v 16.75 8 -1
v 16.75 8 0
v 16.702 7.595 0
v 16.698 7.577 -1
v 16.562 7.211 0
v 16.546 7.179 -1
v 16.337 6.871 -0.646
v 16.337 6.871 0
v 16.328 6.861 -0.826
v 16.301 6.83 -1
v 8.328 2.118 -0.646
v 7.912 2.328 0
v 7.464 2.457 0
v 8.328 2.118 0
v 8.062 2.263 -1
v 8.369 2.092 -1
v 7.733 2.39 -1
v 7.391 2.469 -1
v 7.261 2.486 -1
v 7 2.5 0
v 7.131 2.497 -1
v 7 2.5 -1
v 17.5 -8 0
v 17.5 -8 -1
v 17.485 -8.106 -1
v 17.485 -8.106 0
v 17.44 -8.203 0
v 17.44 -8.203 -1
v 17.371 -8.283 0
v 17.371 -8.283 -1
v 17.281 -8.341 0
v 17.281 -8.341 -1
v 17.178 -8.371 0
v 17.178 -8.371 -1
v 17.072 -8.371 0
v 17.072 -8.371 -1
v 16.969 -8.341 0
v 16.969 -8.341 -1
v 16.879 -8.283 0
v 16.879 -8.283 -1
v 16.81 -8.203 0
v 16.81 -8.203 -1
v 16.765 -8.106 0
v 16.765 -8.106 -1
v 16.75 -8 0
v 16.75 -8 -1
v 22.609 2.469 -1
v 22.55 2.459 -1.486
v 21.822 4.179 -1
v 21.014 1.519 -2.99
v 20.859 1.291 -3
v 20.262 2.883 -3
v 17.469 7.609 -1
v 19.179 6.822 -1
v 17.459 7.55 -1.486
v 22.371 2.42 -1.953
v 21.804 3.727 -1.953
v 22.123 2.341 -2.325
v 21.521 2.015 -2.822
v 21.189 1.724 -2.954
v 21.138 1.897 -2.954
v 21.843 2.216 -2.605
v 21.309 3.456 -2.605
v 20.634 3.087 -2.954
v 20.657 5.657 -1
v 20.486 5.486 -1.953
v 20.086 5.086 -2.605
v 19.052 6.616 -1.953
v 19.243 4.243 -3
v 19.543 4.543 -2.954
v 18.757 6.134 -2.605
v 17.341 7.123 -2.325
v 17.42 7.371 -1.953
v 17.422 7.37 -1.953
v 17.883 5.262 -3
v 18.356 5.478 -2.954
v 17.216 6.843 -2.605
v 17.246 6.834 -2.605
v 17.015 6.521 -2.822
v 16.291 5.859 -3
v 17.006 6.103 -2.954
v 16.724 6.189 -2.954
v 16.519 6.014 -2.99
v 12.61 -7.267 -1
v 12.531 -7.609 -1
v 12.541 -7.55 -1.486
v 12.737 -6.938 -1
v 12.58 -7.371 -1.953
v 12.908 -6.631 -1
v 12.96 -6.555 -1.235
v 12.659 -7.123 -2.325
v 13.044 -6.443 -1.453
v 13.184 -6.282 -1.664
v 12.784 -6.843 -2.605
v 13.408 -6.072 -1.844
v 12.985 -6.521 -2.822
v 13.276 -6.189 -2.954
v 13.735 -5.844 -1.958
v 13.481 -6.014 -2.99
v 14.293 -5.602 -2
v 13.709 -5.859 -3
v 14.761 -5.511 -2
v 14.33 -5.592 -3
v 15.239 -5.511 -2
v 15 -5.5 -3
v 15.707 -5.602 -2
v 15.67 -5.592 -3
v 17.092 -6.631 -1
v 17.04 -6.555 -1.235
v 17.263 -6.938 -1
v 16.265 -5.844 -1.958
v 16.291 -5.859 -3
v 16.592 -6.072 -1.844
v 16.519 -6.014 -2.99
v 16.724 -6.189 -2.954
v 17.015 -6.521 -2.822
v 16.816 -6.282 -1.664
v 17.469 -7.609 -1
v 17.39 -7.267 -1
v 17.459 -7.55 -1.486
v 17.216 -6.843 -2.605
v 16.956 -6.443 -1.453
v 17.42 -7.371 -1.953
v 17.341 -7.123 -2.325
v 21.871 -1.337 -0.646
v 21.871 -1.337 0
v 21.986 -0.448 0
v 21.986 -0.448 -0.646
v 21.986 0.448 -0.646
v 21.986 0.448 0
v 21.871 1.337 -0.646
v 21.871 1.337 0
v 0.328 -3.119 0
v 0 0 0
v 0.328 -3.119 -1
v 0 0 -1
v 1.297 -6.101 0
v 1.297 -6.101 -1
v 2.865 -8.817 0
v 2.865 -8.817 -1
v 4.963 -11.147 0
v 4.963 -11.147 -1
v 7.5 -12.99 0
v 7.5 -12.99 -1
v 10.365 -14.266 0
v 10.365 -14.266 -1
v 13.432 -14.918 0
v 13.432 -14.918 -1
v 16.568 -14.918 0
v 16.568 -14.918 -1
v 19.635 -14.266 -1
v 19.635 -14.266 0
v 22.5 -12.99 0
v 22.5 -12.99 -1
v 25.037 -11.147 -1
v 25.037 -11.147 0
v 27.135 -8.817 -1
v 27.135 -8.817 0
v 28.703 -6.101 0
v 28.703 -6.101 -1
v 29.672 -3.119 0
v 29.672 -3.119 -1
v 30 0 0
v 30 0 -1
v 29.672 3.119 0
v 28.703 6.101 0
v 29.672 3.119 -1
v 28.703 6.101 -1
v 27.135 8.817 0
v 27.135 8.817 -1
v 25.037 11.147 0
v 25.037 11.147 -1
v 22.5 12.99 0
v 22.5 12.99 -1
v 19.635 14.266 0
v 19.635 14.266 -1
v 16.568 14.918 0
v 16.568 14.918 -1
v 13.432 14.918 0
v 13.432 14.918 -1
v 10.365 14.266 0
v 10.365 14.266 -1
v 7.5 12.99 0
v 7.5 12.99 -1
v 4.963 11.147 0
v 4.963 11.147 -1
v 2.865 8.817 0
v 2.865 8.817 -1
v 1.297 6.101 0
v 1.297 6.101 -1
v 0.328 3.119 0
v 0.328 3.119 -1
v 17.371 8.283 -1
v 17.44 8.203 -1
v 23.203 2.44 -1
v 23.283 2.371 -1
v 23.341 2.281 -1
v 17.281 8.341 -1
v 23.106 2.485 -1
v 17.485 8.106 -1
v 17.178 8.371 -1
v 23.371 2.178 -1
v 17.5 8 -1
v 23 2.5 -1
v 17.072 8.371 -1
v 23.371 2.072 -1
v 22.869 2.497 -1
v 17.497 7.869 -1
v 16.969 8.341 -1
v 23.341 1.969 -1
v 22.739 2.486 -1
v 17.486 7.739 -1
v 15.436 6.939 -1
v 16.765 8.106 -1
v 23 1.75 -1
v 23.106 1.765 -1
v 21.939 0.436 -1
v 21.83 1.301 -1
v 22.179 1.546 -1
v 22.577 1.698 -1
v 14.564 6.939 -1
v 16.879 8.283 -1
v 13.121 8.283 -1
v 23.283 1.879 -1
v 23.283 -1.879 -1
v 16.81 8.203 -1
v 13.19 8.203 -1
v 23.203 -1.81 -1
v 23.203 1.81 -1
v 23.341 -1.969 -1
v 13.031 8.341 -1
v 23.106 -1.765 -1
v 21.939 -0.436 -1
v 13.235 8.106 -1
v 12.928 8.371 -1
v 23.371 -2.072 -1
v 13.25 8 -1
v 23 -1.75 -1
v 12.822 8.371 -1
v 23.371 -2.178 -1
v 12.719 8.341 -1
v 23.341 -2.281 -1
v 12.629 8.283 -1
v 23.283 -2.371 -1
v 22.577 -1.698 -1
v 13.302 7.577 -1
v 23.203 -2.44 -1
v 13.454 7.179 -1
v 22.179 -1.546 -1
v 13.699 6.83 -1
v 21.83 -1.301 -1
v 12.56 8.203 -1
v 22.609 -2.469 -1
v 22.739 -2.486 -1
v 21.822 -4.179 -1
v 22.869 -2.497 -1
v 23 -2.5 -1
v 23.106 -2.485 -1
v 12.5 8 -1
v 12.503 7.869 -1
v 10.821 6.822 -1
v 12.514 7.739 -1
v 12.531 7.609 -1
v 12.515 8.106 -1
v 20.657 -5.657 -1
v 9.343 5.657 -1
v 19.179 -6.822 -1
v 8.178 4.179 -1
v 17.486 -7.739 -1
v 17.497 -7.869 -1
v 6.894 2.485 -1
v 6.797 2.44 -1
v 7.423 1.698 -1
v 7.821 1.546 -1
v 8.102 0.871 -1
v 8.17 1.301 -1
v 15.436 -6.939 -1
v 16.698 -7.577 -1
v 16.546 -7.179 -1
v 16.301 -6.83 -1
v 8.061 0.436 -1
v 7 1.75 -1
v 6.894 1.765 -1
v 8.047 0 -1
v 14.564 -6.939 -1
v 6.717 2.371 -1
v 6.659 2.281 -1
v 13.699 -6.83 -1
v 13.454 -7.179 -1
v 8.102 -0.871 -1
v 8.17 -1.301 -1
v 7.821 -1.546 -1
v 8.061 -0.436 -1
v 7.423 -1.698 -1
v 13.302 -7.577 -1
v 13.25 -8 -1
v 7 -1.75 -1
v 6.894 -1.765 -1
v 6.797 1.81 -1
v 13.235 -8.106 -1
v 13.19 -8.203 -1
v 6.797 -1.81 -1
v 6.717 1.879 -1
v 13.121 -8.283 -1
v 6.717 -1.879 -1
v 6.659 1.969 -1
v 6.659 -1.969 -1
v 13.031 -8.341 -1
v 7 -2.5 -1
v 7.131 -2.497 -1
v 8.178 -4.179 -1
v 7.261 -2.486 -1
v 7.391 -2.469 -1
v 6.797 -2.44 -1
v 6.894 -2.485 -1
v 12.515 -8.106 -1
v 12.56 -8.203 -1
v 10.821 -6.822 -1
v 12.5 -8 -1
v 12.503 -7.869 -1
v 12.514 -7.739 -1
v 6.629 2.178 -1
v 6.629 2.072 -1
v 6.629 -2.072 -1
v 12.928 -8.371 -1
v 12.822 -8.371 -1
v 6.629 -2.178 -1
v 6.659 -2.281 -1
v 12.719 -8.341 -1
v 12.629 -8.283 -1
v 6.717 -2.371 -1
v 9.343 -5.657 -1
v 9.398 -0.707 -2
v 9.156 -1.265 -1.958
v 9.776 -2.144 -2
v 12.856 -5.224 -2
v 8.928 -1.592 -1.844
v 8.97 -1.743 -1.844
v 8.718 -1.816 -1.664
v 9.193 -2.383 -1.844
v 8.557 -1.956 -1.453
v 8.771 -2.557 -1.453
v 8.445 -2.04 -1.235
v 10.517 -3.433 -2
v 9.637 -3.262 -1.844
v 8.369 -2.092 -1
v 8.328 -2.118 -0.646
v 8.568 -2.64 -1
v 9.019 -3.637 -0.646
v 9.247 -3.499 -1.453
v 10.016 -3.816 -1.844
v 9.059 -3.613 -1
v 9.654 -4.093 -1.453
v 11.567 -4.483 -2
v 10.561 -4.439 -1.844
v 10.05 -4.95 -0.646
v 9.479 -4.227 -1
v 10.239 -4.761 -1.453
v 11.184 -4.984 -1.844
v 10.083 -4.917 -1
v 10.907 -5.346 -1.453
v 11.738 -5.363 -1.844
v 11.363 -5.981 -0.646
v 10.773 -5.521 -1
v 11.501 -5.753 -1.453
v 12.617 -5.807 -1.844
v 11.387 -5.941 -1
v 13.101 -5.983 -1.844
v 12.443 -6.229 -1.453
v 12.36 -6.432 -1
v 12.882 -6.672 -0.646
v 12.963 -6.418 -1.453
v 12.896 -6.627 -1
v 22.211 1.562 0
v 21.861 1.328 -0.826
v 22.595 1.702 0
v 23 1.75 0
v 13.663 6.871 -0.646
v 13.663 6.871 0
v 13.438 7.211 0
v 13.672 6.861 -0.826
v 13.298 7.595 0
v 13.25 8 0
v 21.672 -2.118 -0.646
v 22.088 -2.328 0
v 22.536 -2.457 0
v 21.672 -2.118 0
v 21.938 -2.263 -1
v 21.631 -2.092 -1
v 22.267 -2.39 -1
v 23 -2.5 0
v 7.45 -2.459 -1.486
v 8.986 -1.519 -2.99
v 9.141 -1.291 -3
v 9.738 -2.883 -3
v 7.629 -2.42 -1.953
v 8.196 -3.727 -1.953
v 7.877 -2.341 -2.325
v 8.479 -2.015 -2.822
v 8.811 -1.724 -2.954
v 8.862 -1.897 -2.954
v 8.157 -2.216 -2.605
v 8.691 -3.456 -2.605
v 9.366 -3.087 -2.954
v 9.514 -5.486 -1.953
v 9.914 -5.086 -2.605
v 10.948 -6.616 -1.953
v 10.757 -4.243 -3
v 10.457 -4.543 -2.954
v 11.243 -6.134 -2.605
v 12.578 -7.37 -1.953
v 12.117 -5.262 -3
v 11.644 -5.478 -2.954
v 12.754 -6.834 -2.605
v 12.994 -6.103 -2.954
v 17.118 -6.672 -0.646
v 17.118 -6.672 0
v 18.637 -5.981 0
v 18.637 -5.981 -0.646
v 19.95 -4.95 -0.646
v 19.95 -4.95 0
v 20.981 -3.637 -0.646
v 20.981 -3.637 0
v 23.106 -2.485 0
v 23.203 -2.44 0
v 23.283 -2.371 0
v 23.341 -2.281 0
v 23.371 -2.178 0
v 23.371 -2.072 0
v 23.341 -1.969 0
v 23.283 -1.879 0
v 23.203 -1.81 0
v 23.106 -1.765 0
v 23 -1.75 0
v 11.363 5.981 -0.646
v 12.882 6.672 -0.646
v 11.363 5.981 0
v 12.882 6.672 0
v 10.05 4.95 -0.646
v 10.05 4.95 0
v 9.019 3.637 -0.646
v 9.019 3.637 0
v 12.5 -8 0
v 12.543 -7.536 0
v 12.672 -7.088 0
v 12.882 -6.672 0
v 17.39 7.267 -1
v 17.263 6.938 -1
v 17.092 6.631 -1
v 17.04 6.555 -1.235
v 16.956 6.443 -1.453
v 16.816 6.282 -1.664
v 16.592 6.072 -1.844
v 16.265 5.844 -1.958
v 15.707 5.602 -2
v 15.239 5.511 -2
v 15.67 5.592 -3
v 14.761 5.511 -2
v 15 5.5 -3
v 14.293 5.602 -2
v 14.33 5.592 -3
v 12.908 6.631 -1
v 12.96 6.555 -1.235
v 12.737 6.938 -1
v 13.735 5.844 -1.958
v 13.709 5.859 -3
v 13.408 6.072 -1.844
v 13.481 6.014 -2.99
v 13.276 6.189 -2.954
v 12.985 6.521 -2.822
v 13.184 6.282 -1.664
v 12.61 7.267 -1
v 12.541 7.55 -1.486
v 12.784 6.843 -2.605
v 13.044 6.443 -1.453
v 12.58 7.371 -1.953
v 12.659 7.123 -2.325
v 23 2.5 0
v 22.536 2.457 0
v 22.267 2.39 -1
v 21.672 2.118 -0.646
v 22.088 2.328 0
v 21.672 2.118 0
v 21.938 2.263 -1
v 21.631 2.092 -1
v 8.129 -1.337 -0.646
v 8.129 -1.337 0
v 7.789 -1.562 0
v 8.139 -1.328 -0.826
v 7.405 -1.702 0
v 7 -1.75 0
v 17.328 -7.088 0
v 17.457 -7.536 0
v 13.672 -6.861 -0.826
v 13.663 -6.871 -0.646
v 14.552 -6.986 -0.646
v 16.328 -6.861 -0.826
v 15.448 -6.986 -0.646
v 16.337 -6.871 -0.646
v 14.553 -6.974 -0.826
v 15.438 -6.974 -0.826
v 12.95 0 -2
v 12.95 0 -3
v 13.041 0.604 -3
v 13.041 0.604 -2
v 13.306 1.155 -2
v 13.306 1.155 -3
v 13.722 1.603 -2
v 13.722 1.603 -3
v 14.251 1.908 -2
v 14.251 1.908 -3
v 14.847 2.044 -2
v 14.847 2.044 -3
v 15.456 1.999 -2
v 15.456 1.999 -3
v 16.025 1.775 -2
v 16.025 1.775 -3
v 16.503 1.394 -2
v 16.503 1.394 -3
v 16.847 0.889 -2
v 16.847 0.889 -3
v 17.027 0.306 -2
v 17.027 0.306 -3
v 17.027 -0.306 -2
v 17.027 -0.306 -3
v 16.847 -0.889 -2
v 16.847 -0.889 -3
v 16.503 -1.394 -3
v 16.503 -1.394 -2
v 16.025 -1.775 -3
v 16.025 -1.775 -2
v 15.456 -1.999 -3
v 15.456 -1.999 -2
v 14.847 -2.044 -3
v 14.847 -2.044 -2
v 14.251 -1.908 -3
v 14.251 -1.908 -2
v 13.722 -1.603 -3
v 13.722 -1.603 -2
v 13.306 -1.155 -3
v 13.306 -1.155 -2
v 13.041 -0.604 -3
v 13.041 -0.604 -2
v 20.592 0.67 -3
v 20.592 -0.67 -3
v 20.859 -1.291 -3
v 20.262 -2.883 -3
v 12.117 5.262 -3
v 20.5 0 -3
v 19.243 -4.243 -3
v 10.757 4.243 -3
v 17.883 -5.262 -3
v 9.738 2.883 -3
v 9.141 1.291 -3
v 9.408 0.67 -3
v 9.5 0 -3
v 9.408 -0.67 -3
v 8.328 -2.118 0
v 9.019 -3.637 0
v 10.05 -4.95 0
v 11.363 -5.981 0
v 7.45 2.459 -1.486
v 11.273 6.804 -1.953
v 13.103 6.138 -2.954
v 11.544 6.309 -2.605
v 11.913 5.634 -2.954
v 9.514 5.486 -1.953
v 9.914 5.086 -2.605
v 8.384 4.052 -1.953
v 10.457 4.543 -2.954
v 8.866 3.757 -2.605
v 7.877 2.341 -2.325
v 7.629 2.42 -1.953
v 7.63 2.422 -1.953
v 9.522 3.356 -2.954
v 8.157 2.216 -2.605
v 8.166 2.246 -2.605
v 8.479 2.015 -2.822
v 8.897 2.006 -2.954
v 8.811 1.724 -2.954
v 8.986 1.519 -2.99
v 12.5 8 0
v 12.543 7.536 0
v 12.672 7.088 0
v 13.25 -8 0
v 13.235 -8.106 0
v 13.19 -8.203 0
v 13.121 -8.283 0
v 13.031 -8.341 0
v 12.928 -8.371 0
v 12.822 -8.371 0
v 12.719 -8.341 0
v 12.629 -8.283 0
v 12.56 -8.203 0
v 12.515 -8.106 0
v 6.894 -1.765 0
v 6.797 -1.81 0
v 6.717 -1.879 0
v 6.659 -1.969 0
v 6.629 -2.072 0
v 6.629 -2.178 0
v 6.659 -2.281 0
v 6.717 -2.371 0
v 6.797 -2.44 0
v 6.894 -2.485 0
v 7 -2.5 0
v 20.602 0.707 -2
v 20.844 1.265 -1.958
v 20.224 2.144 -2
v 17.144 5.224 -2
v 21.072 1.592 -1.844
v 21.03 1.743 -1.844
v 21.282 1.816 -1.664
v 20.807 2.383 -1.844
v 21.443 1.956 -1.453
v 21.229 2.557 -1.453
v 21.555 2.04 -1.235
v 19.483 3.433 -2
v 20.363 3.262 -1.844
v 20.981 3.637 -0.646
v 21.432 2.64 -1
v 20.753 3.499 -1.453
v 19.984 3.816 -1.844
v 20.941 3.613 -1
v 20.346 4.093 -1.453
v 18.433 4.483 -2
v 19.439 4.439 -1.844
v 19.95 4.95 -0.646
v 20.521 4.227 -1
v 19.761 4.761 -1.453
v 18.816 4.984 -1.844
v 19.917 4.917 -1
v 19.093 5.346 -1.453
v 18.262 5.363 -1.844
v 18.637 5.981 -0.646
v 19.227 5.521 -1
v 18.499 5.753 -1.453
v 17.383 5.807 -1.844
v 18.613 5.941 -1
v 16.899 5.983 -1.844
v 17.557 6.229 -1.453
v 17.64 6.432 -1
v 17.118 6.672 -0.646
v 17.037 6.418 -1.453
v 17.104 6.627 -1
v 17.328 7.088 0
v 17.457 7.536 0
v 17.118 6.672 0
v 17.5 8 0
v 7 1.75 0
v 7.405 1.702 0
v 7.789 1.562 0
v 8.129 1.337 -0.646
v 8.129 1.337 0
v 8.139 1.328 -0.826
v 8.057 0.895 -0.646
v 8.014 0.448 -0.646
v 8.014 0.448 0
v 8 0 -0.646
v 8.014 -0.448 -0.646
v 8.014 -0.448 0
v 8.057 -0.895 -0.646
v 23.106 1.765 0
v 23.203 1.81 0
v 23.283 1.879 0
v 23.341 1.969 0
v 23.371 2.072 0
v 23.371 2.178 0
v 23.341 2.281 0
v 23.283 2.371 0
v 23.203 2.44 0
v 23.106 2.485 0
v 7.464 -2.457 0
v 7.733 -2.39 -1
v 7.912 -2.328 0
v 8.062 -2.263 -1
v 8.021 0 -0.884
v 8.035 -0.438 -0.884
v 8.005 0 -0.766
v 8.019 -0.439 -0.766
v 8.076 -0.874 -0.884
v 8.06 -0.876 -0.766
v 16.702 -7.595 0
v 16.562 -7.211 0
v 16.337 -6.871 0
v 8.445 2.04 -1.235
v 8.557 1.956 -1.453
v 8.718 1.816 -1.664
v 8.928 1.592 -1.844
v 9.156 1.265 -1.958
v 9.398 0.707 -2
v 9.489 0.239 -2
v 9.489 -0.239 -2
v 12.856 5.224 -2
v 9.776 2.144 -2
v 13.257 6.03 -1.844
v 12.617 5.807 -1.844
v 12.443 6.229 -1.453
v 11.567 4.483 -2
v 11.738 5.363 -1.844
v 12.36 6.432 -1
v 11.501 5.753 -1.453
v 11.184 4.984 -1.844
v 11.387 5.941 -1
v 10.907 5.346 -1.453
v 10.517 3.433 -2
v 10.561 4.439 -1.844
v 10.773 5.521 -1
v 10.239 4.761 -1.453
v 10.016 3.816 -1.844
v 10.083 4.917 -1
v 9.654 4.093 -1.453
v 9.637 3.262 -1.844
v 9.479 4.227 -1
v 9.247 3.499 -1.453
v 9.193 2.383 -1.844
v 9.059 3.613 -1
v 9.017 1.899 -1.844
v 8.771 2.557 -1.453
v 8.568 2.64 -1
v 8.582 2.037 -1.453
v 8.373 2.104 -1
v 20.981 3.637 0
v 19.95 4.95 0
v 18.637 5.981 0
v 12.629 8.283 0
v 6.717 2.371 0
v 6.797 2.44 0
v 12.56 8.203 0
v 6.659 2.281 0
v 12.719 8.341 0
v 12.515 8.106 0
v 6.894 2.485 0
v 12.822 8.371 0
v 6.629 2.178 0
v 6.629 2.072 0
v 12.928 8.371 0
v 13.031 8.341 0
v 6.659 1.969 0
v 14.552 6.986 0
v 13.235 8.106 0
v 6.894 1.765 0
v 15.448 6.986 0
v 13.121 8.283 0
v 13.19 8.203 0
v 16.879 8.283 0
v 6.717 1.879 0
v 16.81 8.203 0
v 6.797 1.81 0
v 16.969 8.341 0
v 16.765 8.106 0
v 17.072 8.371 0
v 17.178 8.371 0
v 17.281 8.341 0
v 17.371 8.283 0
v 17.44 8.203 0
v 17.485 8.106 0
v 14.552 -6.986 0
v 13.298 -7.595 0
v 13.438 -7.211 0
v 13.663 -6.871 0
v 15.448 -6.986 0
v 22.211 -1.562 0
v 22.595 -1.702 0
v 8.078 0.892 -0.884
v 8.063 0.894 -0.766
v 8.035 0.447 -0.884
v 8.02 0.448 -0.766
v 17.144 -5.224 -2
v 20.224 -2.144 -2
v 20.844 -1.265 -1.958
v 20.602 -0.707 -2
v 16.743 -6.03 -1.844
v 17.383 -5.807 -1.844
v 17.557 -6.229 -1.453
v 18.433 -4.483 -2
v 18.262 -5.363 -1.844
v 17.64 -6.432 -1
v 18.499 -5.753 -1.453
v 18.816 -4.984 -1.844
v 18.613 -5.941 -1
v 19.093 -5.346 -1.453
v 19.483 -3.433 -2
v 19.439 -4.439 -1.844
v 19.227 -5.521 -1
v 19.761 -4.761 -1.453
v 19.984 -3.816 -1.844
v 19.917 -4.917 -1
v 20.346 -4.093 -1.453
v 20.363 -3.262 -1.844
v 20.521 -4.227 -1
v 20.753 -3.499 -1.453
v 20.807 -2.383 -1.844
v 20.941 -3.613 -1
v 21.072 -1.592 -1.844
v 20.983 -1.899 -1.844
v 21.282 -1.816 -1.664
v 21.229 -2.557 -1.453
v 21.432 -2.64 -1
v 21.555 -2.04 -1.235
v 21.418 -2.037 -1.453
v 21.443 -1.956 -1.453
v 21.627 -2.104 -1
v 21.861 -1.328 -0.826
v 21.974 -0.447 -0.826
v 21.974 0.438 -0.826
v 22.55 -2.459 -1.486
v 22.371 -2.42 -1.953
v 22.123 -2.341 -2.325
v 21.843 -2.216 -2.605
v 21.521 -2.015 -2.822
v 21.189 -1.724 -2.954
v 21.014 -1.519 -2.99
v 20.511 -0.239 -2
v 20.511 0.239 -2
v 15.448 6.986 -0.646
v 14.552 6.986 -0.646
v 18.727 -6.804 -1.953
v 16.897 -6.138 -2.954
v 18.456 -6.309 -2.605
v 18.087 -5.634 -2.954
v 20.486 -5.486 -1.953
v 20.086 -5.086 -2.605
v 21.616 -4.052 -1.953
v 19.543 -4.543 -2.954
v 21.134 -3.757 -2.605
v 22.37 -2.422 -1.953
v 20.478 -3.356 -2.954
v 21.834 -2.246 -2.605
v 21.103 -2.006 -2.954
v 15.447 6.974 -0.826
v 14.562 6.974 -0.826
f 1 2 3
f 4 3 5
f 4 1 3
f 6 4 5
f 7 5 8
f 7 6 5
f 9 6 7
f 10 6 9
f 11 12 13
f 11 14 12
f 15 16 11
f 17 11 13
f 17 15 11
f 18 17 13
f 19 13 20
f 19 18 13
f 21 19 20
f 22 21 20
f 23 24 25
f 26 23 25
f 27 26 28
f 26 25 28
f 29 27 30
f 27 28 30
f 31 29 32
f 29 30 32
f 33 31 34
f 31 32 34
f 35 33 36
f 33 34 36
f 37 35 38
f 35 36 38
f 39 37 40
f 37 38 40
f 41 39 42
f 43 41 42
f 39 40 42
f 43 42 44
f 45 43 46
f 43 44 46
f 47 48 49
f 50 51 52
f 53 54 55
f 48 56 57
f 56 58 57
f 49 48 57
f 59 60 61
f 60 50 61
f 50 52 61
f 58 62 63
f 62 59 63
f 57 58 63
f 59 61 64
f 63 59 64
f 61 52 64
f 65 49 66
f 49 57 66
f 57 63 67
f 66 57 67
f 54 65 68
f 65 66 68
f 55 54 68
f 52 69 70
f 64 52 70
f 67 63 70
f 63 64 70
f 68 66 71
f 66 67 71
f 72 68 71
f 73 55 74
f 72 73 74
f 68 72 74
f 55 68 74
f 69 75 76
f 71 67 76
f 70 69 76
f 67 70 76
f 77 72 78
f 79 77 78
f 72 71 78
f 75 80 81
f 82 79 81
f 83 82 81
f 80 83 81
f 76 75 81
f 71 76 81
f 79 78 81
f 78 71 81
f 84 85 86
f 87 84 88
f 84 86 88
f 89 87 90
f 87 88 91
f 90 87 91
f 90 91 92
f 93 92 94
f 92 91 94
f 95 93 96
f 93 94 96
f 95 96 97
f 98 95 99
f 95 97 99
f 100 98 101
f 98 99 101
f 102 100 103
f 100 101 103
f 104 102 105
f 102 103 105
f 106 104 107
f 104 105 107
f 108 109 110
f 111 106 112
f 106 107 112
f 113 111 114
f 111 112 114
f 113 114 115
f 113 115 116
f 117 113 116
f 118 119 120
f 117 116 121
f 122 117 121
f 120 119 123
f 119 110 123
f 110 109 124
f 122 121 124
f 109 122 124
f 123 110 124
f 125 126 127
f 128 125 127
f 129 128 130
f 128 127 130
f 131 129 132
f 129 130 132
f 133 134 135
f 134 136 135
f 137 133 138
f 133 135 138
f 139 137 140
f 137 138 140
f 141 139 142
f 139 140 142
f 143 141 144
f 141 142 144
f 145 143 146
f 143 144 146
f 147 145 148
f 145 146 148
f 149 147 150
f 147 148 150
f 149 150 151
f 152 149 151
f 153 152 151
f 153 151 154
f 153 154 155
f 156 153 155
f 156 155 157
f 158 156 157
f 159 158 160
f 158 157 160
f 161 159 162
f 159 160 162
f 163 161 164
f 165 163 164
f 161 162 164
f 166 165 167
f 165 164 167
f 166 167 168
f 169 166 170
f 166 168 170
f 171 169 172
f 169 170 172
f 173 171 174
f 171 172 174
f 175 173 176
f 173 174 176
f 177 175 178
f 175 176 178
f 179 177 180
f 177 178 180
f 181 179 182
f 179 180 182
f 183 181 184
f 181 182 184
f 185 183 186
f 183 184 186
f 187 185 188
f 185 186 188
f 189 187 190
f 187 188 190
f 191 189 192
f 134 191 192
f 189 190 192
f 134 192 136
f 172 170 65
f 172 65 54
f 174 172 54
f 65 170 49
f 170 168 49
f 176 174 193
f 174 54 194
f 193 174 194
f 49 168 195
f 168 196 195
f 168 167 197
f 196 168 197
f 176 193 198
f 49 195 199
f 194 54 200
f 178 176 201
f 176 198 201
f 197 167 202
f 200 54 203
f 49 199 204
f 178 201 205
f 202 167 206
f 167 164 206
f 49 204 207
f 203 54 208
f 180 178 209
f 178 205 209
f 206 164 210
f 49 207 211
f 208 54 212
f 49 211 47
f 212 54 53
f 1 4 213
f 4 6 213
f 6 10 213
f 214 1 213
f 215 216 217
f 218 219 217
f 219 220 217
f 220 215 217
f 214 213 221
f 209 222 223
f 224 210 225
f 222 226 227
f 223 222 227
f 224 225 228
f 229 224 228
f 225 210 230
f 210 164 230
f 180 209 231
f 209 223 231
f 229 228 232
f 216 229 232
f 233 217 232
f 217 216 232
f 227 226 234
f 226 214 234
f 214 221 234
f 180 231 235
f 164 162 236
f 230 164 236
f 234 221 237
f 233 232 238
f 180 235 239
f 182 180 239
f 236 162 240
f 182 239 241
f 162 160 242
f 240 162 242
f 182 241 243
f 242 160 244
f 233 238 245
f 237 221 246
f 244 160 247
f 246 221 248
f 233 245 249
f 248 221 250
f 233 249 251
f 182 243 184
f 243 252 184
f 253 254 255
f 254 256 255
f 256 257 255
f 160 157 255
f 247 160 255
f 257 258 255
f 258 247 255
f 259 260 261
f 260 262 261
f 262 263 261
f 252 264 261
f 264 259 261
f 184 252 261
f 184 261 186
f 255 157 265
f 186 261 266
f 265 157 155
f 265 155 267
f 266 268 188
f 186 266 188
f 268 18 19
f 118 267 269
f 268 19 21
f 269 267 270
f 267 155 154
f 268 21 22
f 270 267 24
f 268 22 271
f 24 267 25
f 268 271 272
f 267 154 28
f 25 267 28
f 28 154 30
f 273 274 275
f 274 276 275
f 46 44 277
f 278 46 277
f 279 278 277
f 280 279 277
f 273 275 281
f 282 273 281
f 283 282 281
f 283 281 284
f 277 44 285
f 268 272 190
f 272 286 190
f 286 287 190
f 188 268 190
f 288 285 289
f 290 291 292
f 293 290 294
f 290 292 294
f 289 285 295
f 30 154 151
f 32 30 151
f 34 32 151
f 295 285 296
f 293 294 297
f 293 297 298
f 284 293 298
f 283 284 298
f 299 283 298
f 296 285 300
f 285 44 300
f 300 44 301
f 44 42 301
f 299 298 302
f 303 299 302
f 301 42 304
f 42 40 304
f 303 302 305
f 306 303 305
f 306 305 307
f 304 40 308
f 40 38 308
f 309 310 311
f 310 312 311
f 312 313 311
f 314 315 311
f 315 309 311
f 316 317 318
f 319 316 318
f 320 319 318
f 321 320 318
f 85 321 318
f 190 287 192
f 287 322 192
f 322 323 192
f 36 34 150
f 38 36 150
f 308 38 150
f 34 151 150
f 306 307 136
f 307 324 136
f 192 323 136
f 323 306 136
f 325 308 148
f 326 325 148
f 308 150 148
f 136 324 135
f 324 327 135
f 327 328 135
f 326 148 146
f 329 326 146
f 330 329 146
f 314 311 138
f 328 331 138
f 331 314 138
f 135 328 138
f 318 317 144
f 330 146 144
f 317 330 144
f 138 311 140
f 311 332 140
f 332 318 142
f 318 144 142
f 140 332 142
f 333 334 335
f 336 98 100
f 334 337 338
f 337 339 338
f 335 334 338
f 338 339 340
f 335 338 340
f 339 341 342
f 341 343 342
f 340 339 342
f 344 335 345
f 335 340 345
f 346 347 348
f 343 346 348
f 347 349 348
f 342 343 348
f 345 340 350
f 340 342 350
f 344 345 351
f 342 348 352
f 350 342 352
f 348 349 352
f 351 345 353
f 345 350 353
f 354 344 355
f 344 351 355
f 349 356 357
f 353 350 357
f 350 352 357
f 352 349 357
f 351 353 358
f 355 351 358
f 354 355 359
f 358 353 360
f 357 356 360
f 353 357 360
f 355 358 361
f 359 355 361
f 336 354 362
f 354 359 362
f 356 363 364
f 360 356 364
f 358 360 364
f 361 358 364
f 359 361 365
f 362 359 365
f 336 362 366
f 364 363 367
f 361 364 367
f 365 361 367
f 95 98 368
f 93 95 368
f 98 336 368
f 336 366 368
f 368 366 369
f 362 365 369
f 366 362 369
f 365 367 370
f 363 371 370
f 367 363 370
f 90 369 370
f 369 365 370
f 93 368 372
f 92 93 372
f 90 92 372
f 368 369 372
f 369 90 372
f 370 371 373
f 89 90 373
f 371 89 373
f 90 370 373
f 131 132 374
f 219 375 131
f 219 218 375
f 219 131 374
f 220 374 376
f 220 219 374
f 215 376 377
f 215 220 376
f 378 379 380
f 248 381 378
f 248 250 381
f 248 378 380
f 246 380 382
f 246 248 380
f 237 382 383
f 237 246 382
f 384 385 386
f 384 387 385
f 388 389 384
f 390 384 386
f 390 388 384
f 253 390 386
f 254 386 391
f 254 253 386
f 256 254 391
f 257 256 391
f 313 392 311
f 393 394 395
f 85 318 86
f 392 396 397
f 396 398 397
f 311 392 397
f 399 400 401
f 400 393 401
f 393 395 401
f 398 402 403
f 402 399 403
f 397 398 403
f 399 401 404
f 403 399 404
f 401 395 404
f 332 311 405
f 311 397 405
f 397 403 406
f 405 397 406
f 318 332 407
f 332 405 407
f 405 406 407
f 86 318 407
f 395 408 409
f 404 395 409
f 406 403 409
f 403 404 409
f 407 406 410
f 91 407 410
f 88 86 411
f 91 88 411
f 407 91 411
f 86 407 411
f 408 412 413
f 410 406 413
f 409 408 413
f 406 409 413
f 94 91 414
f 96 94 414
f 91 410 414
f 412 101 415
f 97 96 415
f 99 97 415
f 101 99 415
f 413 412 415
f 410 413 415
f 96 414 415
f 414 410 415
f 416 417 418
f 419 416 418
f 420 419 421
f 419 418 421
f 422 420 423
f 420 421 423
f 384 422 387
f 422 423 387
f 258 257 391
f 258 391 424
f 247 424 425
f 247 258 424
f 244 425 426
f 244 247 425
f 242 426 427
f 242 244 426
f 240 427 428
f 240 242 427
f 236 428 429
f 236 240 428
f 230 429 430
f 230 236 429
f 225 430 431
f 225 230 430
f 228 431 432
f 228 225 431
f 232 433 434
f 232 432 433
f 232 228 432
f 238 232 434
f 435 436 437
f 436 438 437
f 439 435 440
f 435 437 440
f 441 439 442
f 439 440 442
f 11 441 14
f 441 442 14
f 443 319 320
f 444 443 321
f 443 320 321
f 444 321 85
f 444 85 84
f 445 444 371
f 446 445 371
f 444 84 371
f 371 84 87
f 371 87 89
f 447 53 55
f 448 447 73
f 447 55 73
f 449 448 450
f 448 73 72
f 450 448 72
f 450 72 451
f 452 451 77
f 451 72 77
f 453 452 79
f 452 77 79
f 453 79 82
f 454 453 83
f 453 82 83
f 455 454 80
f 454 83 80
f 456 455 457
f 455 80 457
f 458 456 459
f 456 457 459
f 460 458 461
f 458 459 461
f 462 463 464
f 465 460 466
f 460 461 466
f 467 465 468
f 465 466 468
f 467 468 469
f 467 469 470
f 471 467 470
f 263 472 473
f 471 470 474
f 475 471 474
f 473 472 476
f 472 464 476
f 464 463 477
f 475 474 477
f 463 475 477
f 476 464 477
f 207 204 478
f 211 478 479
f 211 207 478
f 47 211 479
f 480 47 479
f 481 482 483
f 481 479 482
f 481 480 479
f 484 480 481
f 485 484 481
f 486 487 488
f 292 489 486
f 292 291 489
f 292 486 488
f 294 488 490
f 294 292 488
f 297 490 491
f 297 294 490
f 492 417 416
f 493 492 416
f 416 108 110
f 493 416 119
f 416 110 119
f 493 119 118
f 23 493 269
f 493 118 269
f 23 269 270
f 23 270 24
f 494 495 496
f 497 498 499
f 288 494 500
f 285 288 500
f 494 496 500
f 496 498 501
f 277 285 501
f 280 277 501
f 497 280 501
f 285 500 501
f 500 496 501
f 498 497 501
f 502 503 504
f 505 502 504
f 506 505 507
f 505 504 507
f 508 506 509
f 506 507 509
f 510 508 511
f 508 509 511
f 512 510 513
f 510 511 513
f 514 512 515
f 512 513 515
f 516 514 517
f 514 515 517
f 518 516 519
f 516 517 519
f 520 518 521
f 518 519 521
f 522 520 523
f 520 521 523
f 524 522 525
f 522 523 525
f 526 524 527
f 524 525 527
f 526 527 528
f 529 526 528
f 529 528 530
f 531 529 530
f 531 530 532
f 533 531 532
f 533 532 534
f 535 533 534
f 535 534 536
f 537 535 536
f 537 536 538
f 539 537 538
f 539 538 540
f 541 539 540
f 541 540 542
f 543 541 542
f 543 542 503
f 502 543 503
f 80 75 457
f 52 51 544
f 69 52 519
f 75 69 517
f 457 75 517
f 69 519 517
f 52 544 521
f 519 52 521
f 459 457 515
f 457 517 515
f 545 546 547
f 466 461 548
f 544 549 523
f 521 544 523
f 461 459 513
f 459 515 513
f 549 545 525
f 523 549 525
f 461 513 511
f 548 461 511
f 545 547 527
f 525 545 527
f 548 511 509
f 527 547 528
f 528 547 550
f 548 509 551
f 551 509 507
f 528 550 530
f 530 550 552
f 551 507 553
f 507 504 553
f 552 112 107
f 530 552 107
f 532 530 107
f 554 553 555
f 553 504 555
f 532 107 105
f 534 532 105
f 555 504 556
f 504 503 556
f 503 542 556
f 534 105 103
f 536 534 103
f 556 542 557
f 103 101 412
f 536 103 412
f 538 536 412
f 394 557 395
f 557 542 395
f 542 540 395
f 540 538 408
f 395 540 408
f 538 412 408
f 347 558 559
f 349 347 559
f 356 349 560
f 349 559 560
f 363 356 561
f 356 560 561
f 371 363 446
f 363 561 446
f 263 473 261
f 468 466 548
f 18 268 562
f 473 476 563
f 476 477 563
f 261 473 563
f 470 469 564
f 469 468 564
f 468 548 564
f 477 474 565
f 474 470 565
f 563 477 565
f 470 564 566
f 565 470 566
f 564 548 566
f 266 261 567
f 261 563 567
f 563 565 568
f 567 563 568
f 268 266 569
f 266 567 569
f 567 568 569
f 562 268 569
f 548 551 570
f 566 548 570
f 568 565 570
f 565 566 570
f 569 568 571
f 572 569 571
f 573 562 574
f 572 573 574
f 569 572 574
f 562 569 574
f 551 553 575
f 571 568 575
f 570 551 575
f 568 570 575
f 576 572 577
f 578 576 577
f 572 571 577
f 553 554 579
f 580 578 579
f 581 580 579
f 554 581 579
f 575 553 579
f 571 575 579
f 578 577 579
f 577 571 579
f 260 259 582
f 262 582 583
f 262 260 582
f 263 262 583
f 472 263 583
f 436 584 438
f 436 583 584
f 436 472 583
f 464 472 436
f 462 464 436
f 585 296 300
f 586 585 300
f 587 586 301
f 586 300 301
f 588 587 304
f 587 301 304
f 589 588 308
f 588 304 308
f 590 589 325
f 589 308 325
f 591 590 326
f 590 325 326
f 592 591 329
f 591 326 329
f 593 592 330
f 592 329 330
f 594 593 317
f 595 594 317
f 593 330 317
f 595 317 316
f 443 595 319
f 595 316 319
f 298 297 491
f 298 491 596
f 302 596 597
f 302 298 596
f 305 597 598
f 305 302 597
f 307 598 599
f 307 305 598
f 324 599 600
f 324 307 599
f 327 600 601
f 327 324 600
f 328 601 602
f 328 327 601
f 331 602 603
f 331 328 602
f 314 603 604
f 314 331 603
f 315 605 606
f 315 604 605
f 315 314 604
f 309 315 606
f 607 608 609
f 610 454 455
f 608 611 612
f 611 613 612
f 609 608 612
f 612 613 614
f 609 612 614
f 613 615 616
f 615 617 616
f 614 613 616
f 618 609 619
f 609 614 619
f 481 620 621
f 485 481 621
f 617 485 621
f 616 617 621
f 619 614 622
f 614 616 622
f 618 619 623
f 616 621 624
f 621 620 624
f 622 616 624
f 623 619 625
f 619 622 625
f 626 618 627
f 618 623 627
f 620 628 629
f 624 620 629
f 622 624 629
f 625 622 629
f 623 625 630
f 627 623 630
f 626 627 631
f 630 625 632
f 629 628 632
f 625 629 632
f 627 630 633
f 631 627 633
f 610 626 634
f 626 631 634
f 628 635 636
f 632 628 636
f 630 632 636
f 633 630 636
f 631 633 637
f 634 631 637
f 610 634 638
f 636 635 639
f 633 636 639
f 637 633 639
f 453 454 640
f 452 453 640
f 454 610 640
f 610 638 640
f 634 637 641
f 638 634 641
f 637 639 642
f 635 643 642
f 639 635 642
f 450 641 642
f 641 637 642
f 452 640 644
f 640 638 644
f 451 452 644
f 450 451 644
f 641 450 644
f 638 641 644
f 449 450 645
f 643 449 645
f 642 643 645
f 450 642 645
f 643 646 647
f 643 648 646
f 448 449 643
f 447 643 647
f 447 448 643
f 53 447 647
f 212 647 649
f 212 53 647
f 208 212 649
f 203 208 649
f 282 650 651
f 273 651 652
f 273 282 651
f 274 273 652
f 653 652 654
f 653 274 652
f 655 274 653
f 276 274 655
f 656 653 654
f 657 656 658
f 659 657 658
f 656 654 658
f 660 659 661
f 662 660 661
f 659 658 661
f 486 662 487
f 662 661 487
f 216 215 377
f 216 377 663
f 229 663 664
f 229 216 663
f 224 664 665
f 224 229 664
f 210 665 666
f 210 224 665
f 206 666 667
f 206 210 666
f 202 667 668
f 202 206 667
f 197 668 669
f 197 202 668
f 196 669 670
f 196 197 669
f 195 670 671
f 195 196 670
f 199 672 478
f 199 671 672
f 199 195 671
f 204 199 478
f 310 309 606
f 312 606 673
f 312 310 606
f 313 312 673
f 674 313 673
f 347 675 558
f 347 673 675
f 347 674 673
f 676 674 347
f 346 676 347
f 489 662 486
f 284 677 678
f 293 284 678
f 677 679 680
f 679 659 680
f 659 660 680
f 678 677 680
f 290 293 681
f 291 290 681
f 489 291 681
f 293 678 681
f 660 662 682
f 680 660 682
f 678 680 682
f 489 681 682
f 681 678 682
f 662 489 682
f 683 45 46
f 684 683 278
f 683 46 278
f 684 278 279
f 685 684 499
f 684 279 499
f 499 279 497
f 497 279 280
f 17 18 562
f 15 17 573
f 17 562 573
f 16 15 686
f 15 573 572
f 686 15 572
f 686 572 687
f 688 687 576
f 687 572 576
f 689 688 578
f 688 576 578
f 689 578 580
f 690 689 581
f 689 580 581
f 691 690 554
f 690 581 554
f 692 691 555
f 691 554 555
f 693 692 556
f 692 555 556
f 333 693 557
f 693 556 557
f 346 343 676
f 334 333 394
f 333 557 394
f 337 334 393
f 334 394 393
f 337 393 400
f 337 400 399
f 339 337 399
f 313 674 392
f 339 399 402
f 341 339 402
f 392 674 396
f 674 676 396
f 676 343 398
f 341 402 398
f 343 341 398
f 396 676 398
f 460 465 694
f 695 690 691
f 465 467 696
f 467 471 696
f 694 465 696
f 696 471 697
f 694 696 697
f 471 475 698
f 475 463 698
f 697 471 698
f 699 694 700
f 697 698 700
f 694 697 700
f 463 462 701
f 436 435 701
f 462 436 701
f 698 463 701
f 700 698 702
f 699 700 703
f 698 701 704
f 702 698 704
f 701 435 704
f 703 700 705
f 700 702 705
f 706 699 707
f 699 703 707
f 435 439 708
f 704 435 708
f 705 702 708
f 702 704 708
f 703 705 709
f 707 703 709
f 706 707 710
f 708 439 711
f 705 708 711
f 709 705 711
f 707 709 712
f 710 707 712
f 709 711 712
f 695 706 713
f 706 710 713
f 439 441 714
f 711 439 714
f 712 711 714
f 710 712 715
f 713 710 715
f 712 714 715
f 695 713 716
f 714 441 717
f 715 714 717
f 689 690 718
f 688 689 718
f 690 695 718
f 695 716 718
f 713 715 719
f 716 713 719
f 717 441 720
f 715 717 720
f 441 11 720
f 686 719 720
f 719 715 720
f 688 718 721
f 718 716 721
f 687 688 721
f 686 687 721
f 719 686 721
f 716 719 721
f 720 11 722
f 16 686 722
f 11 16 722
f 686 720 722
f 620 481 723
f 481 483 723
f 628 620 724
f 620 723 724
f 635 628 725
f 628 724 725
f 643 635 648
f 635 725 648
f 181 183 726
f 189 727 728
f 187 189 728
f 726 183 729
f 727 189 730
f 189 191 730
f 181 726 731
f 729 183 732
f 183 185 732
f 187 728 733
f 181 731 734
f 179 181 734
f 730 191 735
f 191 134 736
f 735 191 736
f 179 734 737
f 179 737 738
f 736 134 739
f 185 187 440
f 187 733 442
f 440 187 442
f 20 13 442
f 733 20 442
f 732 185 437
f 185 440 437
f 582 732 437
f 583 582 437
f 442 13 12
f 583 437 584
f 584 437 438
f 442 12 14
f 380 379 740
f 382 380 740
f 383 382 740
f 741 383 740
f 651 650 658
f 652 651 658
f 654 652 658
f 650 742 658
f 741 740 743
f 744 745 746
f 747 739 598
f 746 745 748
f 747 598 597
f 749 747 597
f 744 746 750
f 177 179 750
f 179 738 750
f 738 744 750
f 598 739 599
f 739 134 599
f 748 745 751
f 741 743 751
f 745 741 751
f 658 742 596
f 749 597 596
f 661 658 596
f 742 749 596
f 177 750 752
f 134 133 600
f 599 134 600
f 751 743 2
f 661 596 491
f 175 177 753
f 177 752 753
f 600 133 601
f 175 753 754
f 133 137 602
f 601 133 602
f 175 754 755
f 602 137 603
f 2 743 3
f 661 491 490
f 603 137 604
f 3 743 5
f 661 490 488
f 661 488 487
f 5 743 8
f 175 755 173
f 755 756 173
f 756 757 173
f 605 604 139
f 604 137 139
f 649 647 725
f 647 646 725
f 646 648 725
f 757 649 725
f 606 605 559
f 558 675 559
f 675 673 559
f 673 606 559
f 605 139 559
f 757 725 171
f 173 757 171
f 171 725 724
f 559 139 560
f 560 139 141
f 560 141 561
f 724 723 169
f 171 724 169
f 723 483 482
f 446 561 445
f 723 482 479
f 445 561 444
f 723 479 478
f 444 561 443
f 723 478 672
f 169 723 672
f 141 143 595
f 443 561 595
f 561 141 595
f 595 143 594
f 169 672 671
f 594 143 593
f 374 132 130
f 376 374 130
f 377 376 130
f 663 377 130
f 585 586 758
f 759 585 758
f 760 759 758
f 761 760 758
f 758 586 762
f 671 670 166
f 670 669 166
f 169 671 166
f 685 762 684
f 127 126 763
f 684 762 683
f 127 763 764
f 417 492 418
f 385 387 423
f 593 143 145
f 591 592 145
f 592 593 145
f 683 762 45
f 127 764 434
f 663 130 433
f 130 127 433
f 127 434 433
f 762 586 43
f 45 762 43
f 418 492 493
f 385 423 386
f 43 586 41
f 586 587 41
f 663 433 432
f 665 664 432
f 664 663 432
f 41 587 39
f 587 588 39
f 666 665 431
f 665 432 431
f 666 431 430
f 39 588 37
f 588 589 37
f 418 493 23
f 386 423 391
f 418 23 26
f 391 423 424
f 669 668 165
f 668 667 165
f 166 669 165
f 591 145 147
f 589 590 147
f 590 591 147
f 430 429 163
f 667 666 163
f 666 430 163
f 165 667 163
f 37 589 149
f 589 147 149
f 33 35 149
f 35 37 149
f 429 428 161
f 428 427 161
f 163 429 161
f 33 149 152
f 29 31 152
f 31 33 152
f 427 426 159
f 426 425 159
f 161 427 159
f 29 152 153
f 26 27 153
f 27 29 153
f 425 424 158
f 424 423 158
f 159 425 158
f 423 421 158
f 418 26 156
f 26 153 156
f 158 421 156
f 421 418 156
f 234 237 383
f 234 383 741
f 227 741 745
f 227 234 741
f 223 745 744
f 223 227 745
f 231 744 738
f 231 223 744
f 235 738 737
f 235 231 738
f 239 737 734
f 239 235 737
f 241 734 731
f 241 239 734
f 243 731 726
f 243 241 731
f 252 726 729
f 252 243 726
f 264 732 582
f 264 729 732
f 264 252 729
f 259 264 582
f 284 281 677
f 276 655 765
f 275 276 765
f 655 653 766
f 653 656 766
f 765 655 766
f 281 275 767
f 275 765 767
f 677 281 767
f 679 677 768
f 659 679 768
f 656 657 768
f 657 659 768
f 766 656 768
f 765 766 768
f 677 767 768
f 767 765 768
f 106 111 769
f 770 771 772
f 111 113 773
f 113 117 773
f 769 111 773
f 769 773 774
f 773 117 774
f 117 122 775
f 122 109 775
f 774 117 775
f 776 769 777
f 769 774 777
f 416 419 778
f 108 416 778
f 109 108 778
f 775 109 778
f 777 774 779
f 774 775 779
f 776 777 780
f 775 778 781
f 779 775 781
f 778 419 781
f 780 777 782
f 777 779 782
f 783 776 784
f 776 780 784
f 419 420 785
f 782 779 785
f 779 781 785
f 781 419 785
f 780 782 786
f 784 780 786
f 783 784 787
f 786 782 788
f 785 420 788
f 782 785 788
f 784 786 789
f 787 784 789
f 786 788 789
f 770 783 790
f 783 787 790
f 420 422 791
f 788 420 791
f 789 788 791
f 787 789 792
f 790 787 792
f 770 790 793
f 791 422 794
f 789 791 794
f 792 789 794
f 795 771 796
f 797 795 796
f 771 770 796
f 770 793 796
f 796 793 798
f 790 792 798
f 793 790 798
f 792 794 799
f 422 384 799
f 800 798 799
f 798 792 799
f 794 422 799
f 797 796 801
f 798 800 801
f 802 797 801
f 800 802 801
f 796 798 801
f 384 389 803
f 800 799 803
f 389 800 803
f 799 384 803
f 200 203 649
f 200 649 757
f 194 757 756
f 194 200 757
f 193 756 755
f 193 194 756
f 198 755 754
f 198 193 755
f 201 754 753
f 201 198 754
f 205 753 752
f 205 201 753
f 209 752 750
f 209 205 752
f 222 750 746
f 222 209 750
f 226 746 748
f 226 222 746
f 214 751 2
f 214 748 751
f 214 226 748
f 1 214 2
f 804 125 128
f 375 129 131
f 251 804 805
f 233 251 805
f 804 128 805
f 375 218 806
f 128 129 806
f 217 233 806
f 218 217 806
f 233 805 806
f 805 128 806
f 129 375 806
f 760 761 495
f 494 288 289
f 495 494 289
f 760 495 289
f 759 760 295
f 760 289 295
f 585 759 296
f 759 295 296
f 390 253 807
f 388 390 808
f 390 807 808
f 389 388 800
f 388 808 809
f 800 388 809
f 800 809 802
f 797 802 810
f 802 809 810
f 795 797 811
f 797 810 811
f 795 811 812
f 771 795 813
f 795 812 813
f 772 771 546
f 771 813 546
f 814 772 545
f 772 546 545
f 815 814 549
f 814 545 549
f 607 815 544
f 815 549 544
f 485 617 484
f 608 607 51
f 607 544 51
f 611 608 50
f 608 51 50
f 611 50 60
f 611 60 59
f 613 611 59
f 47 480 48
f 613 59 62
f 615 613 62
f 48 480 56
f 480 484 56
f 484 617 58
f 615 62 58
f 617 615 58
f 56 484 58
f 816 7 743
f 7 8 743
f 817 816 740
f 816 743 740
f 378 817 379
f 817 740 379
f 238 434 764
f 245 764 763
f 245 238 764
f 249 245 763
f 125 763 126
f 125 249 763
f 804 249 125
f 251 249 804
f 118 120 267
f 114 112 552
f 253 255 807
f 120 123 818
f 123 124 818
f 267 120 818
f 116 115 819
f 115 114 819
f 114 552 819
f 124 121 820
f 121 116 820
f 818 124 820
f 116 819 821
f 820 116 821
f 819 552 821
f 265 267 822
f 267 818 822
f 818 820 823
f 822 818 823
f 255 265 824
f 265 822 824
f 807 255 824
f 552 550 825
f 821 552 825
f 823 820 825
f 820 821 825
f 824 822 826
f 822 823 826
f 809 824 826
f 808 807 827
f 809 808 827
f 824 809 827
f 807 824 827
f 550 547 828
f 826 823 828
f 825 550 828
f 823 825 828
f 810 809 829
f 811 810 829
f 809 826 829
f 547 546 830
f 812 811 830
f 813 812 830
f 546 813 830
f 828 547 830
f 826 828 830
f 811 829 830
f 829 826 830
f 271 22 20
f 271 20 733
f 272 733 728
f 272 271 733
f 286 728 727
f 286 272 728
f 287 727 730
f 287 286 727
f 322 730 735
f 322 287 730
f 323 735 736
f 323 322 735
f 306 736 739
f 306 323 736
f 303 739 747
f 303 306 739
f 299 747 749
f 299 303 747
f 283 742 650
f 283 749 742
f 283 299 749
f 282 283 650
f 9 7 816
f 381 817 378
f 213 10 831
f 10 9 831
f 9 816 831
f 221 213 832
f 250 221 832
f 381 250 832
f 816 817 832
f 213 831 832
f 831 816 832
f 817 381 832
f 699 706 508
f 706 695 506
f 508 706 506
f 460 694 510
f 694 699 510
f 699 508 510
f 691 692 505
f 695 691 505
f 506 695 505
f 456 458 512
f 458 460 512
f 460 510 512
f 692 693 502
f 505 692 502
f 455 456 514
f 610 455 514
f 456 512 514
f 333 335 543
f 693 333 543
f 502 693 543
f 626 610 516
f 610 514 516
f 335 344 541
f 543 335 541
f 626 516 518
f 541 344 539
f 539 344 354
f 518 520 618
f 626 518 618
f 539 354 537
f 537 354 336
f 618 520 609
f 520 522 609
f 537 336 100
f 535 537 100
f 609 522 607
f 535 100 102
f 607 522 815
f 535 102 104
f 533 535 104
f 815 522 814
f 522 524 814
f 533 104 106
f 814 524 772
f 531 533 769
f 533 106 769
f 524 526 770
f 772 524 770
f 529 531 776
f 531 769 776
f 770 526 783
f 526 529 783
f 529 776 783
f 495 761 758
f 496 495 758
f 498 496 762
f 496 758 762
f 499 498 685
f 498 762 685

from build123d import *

# Parameters (mm, degrees)
CUT_EXTRUDE1_REACH = 35.675
SKETCH2_R          = 2.5
CUT_EXTRUDE2_DEPTH = 10
SKETCH4_R          = 2.05
CUT_EXTRUDE3_DEPTH = 10


with BuildPart() as part:
    # Sketch1 → Revolve1 (revolve)
    with BuildSketch(Plane(origin=(0, 0, 0), x_dir=(1, 0, 0), z_dir=(0, 1, 0))):
        with BuildLine():
            Line((0, 0), (0, 1))
            Line((0, 1), (7, 1))
            ThreePointArc((7, 1), (7.585786, 2.414214), (9, 3))
            Line((9, 3), (15, 3))
            Line((15, 3), (15, 2))
            Line((15, 2), (9.353553, 2))
            ThreePointArc((9.353553, 2), (8.396447, 1.603553), (8, 0.646447))
            Line((8, 0.646447), (8, 0))
            Line((8, 0), (0, 0))
        make_face()
    revolve(axis=Axis((15, 0, -3), (0, 0, 1)))

    # Cut-Extrude1: up to this face of the body (flat: up to its plane)
    cut_extrude1_end = Plane(part.part.faces().sort_by_distance((29.575736, 0, -1))[0])
    # Sketch2 → Cut-Extrude1 (cut, up to the picked face)
    with BuildSketch(Plane(origin=(0, 0, -3), x_dir=(-1, 0, 0), z_dir=(0, 0, -1)), mode=Mode.PRIVATE) as cut_extrude1_sk1:
        with Locations((-15, 8)):
            Circle(SKETCH2_R)
    cut_extrude1_tool1 = split(extrude(cut_extrude1_sk1.sketch, amount=-CUT_EXTRUDE1_REACH, mode=Mode.PRIVATE), bisect_by=cut_extrude1_end, keep=Keep.BOTH, mode=Mode.PRIVATE)
    # Sketch2 → Cut-Extrude1 (cut, up to the picked face)
    with BuildSketch(Plane(origin=(0, 0, -3), x_dir=(-1, 0, 0), z_dir=(0, 0, -1)), mode=Mode.PRIVATE) as cut_extrude1_sk2:
        with Locations((-7, 0)):
            Circle(SKETCH2_R)
    cut_extrude1_tool2 = split(extrude(cut_extrude1_sk2.sketch, amount=-CUT_EXTRUDE1_REACH, mode=Mode.PRIVATE), bisect_by=cut_extrude1_end, keep=Keep.BOTH, mode=Mode.PRIVATE)
    # Sketch2 → Cut-Extrude1 (cut, up to the picked face)
    with BuildSketch(Plane(origin=(0, 0, -3), x_dir=(-1, 0, 0), z_dir=(0, 0, -1)), mode=Mode.PRIVATE) as cut_extrude1_sk3:
        with Locations((-15, -8)):
            Circle(SKETCH2_R)
    cut_extrude1_tool3 = split(extrude(cut_extrude1_sk3.sketch, amount=-CUT_EXTRUDE1_REACH, mode=Mode.PRIVATE), bisect_by=cut_extrude1_end, keep=Keep.BOTH, mode=Mode.PRIVATE)
    # Sketch2 → Cut-Extrude1 (cut, up to the picked face)
    with BuildSketch(Plane(origin=(0, 0, -3), x_dir=(-1, 0, 0), z_dir=(0, 0, -1)), mode=Mode.PRIVATE) as cut_extrude1_sk4:
        with Locations((-23, 0)):
            Circle(SKETCH2_R)
    cut_extrude1_tool4 = split(extrude(cut_extrude1_sk4.sketch, amount=-CUT_EXTRUDE1_REACH, mode=Mode.PRIVATE), bisect_by=cut_extrude1_end, keep=Keep.BOTH, mode=Mode.PRIVATE)
    add(cut_extrude1_tool1.solids().sort_by(Axis((15, 8, -3), (0, 0, 1)))[0], mode=Mode.SUBTRACT)
    add(cut_extrude1_tool2.solids().sort_by(Axis((7, 0, -3), (0, 0, 1)))[0], mode=Mode.SUBTRACT)
    add(cut_extrude1_tool3.solids().sort_by(Axis((15, -8, -3), (0, 0, 1)))[0], mode=Mode.SUBTRACT)
    add(cut_extrude1_tool4.solids().sort_by(Axis((23, 0, -3), (0, 0, 1)))[0], mode=Mode.SUBTRACT)

    # Sketch3 → Cut-Extrude2 (cut)
    with BuildSketch(Plane(origin=(0, 0, -1), x_dir=(-1, 0, 0), z_dir=(0, 0, -1))):
        with BuildLine():
            ThreePointArc((-12.5, -8), (-15, -5.5), (-17.5, -8))
            ThreePointArc((-17.5, -8), (-17.125, -8.375), (-16.75, -8))
            ThreePointArc((-16.75, -8), (-15, -6.25), (-13.25, -8))
            ThreePointArc((-13.25, -8), (-12.875, -8.375), (-12.5, -8))
        make_face()
        with BuildLine():
            ThreePointArc((-23, -1.75), (-21.25, 0), (-23, 1.75))
            ThreePointArc((-23, 1.75), (-23.375, 2.125), (-23, 2.5))
            ThreePointArc((-23, 2.5), (-20.5, 0), (-23, -2.5))
            ThreePointArc((-23, -2.5), (-23.375, -2.125), (-23, -1.75))
        make_face()
        with BuildLine():
            ThreePointArc((-16.75, 8), (-15, 6.25), (-13.25, 8))
            ThreePointArc((-13.25, 8), (-12.875, 8.375), (-12.5, 8))
            ThreePointArc((-12.5, 8), (-15, 5.5), (-17.5, 8))
            ThreePointArc((-17.5, 8), (-17.125, 8.375), (-16.75, 8))
        make_face()
        with BuildLine():
            ThreePointArc((-7, 1.75), (-8.75, 0), (-7, -1.75))
            ThreePointArc((-7, -1.75), (-6.625, -2.125), (-7, -2.5))
            ThreePointArc((-7, -2.5), (-9.5, 0), (-7, 2.5))
            ThreePointArc((-7, 2.5), (-6.625, 2.125), (-7, 1.75))
        make_face()
    extrude(amount=-CUT_EXTRUDE2_DEPTH, mode=Mode.SUBTRACT)

    # Sketch4 → Cut-Extrude3 (cut)
    with BuildSketch(Plane(origin=(0, 0, -3), x_dir=(-1, 0, 0), z_dir=(0, 0, -1))):
        with Locations((-15, 0)):
            Circle(SKETCH4_R)
    extrude(amount=-CUT_EXTRUDE3_DEPTH, mode=Mode.SUBTRACT)


solid = part.part
